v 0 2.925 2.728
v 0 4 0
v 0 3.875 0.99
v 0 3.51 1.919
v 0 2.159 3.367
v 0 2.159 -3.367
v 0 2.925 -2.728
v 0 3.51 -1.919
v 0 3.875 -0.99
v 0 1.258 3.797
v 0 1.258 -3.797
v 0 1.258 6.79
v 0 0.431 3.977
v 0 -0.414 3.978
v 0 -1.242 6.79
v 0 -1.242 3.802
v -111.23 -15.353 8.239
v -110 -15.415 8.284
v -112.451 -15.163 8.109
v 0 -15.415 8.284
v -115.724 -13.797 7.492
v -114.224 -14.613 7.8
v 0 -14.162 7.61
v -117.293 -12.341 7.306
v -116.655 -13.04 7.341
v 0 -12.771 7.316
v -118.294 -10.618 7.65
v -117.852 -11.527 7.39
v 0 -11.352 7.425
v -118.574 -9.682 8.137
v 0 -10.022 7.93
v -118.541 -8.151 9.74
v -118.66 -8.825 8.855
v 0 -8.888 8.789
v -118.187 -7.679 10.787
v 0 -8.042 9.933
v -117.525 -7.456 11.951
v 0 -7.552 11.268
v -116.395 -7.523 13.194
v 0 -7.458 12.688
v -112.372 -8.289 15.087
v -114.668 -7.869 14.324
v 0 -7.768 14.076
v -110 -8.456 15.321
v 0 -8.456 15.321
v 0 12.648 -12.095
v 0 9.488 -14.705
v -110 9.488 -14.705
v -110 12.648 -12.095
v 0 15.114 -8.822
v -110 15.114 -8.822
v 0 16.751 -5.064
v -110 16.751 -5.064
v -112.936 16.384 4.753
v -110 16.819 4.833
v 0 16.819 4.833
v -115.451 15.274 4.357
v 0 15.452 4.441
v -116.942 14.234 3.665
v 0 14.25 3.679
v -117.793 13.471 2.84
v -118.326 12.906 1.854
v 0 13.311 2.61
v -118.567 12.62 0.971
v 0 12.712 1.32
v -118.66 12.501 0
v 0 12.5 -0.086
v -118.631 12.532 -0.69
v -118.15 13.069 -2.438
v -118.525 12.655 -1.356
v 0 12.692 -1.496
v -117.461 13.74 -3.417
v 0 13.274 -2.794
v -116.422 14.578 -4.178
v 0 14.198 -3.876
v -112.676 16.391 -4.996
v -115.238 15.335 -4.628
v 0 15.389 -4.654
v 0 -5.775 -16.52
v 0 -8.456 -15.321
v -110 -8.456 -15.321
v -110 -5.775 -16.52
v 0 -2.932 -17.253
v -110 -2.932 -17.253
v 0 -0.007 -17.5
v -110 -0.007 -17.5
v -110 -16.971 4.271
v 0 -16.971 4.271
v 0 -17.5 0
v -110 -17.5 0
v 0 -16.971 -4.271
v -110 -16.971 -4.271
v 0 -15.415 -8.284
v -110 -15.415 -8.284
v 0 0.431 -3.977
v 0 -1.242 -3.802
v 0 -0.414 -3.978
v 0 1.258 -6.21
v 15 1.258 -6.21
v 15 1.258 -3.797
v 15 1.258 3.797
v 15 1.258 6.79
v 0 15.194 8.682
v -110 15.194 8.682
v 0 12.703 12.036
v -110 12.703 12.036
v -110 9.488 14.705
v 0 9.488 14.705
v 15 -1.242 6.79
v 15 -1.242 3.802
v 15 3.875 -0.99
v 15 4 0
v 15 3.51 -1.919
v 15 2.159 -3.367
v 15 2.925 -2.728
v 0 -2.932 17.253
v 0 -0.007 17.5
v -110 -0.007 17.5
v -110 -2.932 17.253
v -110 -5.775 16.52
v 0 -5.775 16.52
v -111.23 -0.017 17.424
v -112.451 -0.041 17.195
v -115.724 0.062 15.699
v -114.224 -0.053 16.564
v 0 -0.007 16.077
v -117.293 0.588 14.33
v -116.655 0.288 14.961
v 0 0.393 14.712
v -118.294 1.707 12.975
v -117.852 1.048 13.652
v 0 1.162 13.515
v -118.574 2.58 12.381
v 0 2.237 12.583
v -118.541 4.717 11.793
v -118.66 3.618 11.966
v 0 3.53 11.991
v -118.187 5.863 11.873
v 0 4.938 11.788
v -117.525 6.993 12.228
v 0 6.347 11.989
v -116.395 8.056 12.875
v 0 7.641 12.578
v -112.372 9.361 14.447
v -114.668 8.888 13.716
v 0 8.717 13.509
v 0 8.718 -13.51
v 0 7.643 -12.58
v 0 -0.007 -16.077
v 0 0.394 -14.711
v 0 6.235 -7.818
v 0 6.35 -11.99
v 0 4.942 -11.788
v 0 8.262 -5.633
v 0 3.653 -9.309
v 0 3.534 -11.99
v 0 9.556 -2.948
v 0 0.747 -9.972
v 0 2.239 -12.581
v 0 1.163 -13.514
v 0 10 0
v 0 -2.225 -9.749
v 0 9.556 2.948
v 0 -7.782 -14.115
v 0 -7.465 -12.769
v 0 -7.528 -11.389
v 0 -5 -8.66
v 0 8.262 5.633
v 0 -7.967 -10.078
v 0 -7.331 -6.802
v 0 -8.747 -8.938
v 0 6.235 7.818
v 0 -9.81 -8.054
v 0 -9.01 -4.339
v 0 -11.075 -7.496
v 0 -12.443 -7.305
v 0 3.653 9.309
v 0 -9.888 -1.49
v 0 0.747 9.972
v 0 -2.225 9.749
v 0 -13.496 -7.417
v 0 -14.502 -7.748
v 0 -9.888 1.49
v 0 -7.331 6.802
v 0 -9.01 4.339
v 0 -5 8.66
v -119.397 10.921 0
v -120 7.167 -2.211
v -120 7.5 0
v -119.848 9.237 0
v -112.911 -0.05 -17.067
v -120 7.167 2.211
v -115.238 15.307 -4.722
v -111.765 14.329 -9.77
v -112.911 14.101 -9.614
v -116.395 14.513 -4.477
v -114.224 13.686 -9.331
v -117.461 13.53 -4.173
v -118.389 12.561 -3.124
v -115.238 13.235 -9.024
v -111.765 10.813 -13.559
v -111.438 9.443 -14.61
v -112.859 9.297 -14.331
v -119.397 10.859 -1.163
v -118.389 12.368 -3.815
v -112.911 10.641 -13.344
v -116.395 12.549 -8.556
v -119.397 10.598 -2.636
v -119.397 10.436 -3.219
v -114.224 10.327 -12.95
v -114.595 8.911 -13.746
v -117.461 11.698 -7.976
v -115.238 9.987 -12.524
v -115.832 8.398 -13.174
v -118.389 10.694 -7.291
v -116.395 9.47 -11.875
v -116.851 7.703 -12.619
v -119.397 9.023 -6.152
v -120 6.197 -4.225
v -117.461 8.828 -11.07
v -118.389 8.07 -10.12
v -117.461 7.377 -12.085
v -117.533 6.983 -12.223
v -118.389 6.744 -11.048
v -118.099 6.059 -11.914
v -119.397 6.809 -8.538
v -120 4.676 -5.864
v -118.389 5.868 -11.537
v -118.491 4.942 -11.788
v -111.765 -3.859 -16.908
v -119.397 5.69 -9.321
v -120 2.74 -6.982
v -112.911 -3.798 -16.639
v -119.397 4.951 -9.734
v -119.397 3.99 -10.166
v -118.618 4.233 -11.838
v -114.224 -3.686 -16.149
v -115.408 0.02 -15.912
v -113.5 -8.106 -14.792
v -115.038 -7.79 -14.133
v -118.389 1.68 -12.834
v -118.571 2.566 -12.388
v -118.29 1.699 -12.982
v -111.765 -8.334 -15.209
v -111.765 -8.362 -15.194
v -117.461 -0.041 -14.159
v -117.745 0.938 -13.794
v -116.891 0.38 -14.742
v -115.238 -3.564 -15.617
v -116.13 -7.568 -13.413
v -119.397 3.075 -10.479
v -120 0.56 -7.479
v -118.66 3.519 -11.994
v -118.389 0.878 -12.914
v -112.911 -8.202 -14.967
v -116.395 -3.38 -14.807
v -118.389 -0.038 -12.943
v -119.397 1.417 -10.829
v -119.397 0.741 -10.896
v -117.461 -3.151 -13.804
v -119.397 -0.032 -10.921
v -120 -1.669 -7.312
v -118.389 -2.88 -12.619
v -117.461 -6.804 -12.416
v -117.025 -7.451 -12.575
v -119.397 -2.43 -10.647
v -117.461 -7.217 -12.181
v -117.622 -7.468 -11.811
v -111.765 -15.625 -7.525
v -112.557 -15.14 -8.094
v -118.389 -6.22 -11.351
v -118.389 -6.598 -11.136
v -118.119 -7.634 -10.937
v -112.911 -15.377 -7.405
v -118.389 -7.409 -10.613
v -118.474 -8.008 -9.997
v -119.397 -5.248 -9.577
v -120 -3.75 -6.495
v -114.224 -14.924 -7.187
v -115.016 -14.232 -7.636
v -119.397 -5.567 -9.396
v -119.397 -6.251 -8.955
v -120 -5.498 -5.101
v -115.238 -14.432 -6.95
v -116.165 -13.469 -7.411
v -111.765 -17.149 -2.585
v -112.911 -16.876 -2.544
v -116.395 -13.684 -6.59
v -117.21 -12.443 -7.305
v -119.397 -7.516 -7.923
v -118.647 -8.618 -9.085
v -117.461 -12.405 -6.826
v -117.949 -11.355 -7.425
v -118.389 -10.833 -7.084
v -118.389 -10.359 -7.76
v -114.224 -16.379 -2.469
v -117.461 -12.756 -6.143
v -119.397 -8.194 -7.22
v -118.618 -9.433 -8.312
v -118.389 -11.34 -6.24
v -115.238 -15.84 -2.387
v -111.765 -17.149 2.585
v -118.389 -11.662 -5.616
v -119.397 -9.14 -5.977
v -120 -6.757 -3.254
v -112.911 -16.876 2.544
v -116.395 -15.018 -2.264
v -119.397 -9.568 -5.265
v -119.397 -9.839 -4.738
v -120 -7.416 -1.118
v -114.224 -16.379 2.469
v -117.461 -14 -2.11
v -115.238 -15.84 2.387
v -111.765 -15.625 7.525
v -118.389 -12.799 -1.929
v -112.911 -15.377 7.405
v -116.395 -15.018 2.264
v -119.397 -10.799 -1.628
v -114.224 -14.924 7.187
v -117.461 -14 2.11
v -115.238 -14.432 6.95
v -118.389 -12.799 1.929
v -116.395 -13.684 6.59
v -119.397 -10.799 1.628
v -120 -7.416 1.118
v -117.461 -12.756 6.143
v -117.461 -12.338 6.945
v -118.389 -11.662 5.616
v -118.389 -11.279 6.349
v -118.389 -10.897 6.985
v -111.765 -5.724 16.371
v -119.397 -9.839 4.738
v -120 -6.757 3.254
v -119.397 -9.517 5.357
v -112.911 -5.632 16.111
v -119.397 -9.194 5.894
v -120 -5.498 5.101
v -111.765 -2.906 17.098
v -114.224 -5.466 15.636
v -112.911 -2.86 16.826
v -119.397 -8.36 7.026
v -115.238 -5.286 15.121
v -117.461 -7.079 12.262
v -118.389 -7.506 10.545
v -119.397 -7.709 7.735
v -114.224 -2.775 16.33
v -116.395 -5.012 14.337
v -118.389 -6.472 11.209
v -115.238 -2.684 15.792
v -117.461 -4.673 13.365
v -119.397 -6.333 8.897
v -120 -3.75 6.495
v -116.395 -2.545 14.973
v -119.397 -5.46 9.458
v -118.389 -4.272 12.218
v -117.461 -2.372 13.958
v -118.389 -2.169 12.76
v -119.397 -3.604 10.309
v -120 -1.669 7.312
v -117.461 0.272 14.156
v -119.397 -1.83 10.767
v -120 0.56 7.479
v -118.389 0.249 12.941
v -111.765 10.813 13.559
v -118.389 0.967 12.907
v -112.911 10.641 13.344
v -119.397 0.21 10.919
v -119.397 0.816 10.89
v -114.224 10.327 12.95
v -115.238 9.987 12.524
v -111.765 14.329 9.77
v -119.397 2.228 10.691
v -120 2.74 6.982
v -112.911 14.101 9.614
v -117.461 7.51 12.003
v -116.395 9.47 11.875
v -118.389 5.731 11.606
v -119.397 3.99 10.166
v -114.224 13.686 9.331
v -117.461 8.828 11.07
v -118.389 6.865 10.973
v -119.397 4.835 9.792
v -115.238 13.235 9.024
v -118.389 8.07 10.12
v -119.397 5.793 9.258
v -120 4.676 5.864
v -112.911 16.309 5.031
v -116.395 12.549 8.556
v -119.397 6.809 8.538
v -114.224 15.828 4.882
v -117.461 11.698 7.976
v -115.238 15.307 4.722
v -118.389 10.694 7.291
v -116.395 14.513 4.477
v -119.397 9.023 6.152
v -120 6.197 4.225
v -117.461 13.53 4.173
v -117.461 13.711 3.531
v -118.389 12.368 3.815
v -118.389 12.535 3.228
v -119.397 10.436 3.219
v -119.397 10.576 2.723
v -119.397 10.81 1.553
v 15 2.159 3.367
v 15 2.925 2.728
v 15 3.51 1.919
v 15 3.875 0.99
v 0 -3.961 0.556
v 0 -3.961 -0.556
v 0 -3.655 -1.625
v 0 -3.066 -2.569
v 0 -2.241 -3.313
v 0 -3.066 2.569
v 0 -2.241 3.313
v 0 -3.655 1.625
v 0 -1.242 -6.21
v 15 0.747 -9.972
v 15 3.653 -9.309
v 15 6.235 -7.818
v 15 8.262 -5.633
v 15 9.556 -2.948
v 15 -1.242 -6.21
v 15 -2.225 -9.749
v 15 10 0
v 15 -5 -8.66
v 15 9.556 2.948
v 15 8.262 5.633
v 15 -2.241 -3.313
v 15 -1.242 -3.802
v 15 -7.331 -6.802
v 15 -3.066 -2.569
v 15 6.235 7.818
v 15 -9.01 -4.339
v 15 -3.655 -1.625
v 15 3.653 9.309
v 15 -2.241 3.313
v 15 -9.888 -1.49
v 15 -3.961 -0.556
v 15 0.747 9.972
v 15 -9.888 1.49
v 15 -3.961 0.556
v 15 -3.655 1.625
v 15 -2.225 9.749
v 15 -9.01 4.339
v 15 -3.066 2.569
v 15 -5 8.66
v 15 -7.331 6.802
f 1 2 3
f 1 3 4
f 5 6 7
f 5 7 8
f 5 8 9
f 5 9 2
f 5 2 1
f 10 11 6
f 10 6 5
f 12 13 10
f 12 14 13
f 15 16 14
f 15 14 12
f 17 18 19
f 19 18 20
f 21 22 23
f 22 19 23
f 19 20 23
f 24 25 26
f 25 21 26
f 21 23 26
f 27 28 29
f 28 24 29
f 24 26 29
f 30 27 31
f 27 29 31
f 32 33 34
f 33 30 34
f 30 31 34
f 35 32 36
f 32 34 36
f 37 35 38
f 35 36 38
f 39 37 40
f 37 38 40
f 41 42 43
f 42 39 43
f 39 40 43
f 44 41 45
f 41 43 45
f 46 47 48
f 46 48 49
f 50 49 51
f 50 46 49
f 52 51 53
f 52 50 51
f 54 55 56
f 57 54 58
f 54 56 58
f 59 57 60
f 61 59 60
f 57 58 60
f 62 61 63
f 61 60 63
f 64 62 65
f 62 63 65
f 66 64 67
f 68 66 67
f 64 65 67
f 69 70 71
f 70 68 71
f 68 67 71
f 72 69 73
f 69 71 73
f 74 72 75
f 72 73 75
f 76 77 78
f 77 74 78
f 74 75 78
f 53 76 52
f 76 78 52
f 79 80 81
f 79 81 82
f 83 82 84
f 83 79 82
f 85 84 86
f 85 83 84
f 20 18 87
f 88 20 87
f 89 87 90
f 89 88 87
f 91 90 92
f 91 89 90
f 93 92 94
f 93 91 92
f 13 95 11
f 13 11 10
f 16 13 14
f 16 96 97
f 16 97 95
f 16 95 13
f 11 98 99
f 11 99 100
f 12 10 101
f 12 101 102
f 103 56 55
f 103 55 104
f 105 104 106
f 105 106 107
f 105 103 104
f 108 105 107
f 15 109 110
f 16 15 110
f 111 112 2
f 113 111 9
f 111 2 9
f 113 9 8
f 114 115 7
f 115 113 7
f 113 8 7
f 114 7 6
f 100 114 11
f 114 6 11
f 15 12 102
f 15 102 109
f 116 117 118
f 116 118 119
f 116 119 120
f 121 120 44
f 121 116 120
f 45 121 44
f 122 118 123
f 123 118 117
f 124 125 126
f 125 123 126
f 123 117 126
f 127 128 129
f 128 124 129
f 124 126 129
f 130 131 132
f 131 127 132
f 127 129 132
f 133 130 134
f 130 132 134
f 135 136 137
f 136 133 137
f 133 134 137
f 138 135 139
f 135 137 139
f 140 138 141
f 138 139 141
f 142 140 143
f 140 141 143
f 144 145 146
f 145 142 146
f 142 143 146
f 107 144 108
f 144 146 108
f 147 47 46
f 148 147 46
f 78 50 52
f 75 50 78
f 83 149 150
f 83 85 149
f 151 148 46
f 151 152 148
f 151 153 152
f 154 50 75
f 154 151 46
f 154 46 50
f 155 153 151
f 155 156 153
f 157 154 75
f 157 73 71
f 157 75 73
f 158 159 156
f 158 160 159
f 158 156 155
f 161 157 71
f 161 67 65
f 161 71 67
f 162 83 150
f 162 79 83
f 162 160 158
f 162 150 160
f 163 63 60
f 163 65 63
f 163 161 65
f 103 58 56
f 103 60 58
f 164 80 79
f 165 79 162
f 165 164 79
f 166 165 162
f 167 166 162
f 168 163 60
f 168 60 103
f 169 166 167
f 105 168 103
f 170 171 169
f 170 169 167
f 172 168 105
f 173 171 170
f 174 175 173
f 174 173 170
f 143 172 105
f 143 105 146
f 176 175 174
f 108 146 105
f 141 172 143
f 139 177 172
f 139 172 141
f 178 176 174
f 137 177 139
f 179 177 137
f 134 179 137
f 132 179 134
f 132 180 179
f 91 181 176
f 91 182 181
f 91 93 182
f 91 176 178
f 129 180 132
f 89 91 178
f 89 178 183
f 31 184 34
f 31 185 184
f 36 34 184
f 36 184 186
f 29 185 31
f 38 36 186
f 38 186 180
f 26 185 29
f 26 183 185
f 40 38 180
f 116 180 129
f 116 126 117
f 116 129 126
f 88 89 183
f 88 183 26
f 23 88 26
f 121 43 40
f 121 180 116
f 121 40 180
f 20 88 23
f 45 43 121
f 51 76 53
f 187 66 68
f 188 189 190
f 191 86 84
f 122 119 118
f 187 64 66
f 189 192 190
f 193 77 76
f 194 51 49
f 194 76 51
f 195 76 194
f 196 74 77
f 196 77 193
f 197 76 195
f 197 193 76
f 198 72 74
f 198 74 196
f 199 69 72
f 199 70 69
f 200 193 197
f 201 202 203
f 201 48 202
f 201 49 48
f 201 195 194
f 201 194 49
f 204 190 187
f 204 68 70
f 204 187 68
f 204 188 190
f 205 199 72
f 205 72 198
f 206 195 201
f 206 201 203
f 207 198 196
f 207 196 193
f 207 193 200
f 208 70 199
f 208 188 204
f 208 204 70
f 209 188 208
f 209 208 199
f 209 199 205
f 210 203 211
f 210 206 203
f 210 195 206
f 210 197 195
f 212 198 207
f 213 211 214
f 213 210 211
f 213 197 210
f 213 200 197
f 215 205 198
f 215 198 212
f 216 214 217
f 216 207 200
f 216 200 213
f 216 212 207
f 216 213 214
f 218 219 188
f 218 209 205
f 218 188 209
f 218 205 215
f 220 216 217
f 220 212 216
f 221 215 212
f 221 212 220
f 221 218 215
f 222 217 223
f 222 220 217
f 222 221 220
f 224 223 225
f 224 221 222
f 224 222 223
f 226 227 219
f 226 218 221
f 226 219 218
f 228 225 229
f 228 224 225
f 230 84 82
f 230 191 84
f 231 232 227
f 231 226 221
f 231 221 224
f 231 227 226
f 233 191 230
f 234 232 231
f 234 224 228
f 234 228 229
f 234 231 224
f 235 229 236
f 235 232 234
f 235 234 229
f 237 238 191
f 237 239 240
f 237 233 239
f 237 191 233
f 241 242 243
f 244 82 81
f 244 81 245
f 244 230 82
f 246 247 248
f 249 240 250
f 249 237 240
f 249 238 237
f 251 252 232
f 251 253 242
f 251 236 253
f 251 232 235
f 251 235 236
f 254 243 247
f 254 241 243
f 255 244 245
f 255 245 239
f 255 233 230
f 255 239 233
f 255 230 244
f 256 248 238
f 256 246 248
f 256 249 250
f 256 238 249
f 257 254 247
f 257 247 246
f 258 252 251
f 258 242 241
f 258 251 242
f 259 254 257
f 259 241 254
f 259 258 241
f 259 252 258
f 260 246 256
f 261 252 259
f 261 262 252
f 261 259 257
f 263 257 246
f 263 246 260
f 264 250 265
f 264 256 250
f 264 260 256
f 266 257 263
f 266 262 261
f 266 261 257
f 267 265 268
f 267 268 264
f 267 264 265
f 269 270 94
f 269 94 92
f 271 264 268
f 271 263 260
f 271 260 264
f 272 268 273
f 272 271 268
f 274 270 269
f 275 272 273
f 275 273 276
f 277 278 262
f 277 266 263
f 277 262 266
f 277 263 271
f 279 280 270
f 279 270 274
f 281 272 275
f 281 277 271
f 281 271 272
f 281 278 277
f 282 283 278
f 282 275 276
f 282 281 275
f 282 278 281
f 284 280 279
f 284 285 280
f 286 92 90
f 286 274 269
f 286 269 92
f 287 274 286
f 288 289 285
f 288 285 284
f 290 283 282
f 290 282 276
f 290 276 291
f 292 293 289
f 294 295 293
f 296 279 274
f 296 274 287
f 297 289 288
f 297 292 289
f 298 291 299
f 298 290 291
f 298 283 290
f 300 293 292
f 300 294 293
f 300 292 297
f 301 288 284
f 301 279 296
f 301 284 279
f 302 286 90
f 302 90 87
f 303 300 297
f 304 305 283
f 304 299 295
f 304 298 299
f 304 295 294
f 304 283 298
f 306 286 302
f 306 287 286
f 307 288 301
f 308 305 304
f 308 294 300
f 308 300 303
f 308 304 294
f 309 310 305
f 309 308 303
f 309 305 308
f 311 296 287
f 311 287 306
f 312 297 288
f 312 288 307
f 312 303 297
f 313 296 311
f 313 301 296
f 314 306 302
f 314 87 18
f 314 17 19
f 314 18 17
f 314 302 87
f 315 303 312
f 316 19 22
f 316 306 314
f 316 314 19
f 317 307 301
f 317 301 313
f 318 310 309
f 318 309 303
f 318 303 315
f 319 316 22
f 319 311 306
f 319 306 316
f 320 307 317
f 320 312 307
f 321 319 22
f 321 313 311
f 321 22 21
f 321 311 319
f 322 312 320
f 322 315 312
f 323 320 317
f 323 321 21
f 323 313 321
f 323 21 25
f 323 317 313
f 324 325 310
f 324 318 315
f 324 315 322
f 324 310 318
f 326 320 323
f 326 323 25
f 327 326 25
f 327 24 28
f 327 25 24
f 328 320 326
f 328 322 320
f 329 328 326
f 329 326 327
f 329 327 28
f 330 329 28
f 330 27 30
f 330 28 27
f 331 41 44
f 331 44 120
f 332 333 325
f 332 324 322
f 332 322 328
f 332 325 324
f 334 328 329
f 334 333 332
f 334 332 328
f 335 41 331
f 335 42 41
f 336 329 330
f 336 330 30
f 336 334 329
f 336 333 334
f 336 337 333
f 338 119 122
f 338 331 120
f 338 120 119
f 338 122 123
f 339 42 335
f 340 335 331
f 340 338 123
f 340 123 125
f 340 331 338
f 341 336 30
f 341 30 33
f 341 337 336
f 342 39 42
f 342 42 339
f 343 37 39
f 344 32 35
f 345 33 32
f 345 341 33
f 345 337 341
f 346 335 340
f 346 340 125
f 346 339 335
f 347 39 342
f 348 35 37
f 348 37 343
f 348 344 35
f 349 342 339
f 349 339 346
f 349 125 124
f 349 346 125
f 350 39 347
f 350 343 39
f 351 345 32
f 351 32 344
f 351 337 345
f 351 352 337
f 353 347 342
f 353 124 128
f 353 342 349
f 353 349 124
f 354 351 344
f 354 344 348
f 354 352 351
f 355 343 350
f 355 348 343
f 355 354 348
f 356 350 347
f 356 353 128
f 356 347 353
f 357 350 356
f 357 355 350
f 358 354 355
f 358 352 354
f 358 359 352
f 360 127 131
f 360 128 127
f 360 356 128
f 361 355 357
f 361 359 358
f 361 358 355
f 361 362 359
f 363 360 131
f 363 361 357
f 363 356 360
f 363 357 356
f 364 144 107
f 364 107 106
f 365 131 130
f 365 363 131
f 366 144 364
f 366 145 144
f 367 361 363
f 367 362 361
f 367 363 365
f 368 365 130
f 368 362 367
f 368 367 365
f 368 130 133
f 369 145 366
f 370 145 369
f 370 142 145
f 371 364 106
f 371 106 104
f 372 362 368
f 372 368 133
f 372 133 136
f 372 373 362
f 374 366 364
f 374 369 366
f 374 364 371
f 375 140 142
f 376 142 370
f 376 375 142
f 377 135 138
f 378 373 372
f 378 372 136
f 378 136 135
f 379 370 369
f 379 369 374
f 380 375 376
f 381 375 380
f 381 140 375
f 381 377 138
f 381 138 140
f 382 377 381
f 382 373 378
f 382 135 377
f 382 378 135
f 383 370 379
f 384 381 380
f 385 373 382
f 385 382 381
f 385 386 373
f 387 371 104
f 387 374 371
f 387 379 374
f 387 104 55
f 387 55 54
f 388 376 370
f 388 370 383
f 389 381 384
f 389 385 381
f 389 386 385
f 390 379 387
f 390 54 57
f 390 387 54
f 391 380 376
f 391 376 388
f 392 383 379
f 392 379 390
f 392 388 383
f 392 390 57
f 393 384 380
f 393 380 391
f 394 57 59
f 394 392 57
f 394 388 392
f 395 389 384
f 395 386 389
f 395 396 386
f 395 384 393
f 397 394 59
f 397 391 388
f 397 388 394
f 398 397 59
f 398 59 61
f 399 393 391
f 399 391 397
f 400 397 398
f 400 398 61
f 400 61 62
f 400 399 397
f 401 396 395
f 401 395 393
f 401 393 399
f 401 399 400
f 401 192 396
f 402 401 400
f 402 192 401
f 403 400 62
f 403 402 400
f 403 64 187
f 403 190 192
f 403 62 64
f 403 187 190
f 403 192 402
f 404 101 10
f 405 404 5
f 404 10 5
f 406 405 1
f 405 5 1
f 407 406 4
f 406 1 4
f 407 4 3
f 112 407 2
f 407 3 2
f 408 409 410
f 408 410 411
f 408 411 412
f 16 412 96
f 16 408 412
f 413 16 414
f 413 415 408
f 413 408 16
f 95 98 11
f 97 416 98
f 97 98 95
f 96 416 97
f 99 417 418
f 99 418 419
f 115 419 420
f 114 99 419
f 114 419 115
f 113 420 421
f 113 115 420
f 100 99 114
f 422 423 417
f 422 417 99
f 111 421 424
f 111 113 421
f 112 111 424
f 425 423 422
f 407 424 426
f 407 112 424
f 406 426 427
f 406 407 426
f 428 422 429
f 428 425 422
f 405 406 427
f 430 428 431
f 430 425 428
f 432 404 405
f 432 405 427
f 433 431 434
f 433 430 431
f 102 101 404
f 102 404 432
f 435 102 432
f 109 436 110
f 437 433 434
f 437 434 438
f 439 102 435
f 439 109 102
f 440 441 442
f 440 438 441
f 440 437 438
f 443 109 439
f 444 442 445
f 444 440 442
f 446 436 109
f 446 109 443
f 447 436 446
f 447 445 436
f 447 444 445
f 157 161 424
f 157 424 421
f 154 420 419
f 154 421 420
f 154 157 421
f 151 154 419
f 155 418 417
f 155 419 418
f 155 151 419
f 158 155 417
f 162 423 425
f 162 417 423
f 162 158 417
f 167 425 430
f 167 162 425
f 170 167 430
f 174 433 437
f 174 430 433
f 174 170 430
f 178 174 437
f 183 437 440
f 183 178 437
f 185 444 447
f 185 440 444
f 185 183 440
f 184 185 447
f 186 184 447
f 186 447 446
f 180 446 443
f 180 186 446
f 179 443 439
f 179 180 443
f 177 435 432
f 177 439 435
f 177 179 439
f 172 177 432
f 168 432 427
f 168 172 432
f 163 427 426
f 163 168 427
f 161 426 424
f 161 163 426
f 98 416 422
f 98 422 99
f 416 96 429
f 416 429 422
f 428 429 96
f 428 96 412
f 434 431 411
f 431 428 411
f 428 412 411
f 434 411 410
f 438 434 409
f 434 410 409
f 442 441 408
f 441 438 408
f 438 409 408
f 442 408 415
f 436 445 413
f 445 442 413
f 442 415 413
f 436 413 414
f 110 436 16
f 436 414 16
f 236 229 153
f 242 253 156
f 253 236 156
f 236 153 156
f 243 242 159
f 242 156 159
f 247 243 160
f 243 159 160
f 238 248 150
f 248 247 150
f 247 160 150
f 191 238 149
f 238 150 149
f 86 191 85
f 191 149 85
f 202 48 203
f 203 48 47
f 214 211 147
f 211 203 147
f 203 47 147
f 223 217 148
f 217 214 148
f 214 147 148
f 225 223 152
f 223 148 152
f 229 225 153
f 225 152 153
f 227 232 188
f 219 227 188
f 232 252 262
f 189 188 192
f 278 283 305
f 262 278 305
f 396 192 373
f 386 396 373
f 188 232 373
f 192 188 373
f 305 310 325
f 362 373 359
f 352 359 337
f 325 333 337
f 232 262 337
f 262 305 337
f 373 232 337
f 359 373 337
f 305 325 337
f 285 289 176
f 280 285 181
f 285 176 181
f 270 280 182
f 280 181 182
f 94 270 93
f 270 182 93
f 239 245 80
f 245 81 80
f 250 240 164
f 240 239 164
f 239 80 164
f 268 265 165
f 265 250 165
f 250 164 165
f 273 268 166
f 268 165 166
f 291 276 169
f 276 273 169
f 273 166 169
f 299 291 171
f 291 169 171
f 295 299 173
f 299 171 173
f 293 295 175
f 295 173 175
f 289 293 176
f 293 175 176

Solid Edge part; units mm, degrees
sketch "Sketch1" plane through (0, 0, 0) normal (1, 0, 0) x (0, 1, 0)
  circle A0 centre (0, 0) radius 10
extrude "Protrusion1" add sketch "Sketch1" along normal blind 15
sketch "Sketch2" plane through (0, 0, 0) normal (1, 0, 0) x (0, 1, 0)
  circle A0 centre (0, 0) radius 17.5
extrude "拉伸_6" add sketch "Sketch2" against normal blind 120
fillet "倒圆_1" radius 10 1 edges at (-120, -17.5, 0)
sketch "Sketch3" plane through (0, 0, 0) normal (1, 0, 0) x (0, 0, 1)
  circle A0 centre (-0.1208, -17.4996) radius 5
  circle A1 centre (16.7876, -4.9424) radius 5
  circle A2 centre (-16.7876, -4.9424) radius 5
  circle A3 centre (12.3049, 12.4434) radius 5
  circle A4 centre (-12.3049, 12.4434) radius 5
  dimension "D1" = 10
  dimension "D2" = 10
  dimension "D3" = 10
  dimension "D4" = 10
  dimension "D5" = 10
extrude "Cutout1" cut sketch "Sketch3" against normal up to vertex (120 mm away)
sketch "Sketch4" plane through (0, 0, 0) normal (1, 0, 0) x (0, 1, 0)
  circle A0 centre (0, 0) radius 4
  line L0 (-1.2419, -6.2095) -> (1.2581, -6.2095)
  line L1 (1.2581, -6.2095) -> (1.2581, 6.7905)
  line L2 (1.2581, 6.7905) -> (-1.2419, 6.7905)
  line L3 (-1.2419, 6.7905) -> (-1.2419, -6.2095)
  dimension "D1" = 8
  dimension "D2" = 2.5
  dimension "D3" = 13
  dimension "D4" = 2.5
extrude "拉伸除料_3" cut sketch "Sketch4" along normal blind 15
properties material "ABS 高抗冲击塑料"
